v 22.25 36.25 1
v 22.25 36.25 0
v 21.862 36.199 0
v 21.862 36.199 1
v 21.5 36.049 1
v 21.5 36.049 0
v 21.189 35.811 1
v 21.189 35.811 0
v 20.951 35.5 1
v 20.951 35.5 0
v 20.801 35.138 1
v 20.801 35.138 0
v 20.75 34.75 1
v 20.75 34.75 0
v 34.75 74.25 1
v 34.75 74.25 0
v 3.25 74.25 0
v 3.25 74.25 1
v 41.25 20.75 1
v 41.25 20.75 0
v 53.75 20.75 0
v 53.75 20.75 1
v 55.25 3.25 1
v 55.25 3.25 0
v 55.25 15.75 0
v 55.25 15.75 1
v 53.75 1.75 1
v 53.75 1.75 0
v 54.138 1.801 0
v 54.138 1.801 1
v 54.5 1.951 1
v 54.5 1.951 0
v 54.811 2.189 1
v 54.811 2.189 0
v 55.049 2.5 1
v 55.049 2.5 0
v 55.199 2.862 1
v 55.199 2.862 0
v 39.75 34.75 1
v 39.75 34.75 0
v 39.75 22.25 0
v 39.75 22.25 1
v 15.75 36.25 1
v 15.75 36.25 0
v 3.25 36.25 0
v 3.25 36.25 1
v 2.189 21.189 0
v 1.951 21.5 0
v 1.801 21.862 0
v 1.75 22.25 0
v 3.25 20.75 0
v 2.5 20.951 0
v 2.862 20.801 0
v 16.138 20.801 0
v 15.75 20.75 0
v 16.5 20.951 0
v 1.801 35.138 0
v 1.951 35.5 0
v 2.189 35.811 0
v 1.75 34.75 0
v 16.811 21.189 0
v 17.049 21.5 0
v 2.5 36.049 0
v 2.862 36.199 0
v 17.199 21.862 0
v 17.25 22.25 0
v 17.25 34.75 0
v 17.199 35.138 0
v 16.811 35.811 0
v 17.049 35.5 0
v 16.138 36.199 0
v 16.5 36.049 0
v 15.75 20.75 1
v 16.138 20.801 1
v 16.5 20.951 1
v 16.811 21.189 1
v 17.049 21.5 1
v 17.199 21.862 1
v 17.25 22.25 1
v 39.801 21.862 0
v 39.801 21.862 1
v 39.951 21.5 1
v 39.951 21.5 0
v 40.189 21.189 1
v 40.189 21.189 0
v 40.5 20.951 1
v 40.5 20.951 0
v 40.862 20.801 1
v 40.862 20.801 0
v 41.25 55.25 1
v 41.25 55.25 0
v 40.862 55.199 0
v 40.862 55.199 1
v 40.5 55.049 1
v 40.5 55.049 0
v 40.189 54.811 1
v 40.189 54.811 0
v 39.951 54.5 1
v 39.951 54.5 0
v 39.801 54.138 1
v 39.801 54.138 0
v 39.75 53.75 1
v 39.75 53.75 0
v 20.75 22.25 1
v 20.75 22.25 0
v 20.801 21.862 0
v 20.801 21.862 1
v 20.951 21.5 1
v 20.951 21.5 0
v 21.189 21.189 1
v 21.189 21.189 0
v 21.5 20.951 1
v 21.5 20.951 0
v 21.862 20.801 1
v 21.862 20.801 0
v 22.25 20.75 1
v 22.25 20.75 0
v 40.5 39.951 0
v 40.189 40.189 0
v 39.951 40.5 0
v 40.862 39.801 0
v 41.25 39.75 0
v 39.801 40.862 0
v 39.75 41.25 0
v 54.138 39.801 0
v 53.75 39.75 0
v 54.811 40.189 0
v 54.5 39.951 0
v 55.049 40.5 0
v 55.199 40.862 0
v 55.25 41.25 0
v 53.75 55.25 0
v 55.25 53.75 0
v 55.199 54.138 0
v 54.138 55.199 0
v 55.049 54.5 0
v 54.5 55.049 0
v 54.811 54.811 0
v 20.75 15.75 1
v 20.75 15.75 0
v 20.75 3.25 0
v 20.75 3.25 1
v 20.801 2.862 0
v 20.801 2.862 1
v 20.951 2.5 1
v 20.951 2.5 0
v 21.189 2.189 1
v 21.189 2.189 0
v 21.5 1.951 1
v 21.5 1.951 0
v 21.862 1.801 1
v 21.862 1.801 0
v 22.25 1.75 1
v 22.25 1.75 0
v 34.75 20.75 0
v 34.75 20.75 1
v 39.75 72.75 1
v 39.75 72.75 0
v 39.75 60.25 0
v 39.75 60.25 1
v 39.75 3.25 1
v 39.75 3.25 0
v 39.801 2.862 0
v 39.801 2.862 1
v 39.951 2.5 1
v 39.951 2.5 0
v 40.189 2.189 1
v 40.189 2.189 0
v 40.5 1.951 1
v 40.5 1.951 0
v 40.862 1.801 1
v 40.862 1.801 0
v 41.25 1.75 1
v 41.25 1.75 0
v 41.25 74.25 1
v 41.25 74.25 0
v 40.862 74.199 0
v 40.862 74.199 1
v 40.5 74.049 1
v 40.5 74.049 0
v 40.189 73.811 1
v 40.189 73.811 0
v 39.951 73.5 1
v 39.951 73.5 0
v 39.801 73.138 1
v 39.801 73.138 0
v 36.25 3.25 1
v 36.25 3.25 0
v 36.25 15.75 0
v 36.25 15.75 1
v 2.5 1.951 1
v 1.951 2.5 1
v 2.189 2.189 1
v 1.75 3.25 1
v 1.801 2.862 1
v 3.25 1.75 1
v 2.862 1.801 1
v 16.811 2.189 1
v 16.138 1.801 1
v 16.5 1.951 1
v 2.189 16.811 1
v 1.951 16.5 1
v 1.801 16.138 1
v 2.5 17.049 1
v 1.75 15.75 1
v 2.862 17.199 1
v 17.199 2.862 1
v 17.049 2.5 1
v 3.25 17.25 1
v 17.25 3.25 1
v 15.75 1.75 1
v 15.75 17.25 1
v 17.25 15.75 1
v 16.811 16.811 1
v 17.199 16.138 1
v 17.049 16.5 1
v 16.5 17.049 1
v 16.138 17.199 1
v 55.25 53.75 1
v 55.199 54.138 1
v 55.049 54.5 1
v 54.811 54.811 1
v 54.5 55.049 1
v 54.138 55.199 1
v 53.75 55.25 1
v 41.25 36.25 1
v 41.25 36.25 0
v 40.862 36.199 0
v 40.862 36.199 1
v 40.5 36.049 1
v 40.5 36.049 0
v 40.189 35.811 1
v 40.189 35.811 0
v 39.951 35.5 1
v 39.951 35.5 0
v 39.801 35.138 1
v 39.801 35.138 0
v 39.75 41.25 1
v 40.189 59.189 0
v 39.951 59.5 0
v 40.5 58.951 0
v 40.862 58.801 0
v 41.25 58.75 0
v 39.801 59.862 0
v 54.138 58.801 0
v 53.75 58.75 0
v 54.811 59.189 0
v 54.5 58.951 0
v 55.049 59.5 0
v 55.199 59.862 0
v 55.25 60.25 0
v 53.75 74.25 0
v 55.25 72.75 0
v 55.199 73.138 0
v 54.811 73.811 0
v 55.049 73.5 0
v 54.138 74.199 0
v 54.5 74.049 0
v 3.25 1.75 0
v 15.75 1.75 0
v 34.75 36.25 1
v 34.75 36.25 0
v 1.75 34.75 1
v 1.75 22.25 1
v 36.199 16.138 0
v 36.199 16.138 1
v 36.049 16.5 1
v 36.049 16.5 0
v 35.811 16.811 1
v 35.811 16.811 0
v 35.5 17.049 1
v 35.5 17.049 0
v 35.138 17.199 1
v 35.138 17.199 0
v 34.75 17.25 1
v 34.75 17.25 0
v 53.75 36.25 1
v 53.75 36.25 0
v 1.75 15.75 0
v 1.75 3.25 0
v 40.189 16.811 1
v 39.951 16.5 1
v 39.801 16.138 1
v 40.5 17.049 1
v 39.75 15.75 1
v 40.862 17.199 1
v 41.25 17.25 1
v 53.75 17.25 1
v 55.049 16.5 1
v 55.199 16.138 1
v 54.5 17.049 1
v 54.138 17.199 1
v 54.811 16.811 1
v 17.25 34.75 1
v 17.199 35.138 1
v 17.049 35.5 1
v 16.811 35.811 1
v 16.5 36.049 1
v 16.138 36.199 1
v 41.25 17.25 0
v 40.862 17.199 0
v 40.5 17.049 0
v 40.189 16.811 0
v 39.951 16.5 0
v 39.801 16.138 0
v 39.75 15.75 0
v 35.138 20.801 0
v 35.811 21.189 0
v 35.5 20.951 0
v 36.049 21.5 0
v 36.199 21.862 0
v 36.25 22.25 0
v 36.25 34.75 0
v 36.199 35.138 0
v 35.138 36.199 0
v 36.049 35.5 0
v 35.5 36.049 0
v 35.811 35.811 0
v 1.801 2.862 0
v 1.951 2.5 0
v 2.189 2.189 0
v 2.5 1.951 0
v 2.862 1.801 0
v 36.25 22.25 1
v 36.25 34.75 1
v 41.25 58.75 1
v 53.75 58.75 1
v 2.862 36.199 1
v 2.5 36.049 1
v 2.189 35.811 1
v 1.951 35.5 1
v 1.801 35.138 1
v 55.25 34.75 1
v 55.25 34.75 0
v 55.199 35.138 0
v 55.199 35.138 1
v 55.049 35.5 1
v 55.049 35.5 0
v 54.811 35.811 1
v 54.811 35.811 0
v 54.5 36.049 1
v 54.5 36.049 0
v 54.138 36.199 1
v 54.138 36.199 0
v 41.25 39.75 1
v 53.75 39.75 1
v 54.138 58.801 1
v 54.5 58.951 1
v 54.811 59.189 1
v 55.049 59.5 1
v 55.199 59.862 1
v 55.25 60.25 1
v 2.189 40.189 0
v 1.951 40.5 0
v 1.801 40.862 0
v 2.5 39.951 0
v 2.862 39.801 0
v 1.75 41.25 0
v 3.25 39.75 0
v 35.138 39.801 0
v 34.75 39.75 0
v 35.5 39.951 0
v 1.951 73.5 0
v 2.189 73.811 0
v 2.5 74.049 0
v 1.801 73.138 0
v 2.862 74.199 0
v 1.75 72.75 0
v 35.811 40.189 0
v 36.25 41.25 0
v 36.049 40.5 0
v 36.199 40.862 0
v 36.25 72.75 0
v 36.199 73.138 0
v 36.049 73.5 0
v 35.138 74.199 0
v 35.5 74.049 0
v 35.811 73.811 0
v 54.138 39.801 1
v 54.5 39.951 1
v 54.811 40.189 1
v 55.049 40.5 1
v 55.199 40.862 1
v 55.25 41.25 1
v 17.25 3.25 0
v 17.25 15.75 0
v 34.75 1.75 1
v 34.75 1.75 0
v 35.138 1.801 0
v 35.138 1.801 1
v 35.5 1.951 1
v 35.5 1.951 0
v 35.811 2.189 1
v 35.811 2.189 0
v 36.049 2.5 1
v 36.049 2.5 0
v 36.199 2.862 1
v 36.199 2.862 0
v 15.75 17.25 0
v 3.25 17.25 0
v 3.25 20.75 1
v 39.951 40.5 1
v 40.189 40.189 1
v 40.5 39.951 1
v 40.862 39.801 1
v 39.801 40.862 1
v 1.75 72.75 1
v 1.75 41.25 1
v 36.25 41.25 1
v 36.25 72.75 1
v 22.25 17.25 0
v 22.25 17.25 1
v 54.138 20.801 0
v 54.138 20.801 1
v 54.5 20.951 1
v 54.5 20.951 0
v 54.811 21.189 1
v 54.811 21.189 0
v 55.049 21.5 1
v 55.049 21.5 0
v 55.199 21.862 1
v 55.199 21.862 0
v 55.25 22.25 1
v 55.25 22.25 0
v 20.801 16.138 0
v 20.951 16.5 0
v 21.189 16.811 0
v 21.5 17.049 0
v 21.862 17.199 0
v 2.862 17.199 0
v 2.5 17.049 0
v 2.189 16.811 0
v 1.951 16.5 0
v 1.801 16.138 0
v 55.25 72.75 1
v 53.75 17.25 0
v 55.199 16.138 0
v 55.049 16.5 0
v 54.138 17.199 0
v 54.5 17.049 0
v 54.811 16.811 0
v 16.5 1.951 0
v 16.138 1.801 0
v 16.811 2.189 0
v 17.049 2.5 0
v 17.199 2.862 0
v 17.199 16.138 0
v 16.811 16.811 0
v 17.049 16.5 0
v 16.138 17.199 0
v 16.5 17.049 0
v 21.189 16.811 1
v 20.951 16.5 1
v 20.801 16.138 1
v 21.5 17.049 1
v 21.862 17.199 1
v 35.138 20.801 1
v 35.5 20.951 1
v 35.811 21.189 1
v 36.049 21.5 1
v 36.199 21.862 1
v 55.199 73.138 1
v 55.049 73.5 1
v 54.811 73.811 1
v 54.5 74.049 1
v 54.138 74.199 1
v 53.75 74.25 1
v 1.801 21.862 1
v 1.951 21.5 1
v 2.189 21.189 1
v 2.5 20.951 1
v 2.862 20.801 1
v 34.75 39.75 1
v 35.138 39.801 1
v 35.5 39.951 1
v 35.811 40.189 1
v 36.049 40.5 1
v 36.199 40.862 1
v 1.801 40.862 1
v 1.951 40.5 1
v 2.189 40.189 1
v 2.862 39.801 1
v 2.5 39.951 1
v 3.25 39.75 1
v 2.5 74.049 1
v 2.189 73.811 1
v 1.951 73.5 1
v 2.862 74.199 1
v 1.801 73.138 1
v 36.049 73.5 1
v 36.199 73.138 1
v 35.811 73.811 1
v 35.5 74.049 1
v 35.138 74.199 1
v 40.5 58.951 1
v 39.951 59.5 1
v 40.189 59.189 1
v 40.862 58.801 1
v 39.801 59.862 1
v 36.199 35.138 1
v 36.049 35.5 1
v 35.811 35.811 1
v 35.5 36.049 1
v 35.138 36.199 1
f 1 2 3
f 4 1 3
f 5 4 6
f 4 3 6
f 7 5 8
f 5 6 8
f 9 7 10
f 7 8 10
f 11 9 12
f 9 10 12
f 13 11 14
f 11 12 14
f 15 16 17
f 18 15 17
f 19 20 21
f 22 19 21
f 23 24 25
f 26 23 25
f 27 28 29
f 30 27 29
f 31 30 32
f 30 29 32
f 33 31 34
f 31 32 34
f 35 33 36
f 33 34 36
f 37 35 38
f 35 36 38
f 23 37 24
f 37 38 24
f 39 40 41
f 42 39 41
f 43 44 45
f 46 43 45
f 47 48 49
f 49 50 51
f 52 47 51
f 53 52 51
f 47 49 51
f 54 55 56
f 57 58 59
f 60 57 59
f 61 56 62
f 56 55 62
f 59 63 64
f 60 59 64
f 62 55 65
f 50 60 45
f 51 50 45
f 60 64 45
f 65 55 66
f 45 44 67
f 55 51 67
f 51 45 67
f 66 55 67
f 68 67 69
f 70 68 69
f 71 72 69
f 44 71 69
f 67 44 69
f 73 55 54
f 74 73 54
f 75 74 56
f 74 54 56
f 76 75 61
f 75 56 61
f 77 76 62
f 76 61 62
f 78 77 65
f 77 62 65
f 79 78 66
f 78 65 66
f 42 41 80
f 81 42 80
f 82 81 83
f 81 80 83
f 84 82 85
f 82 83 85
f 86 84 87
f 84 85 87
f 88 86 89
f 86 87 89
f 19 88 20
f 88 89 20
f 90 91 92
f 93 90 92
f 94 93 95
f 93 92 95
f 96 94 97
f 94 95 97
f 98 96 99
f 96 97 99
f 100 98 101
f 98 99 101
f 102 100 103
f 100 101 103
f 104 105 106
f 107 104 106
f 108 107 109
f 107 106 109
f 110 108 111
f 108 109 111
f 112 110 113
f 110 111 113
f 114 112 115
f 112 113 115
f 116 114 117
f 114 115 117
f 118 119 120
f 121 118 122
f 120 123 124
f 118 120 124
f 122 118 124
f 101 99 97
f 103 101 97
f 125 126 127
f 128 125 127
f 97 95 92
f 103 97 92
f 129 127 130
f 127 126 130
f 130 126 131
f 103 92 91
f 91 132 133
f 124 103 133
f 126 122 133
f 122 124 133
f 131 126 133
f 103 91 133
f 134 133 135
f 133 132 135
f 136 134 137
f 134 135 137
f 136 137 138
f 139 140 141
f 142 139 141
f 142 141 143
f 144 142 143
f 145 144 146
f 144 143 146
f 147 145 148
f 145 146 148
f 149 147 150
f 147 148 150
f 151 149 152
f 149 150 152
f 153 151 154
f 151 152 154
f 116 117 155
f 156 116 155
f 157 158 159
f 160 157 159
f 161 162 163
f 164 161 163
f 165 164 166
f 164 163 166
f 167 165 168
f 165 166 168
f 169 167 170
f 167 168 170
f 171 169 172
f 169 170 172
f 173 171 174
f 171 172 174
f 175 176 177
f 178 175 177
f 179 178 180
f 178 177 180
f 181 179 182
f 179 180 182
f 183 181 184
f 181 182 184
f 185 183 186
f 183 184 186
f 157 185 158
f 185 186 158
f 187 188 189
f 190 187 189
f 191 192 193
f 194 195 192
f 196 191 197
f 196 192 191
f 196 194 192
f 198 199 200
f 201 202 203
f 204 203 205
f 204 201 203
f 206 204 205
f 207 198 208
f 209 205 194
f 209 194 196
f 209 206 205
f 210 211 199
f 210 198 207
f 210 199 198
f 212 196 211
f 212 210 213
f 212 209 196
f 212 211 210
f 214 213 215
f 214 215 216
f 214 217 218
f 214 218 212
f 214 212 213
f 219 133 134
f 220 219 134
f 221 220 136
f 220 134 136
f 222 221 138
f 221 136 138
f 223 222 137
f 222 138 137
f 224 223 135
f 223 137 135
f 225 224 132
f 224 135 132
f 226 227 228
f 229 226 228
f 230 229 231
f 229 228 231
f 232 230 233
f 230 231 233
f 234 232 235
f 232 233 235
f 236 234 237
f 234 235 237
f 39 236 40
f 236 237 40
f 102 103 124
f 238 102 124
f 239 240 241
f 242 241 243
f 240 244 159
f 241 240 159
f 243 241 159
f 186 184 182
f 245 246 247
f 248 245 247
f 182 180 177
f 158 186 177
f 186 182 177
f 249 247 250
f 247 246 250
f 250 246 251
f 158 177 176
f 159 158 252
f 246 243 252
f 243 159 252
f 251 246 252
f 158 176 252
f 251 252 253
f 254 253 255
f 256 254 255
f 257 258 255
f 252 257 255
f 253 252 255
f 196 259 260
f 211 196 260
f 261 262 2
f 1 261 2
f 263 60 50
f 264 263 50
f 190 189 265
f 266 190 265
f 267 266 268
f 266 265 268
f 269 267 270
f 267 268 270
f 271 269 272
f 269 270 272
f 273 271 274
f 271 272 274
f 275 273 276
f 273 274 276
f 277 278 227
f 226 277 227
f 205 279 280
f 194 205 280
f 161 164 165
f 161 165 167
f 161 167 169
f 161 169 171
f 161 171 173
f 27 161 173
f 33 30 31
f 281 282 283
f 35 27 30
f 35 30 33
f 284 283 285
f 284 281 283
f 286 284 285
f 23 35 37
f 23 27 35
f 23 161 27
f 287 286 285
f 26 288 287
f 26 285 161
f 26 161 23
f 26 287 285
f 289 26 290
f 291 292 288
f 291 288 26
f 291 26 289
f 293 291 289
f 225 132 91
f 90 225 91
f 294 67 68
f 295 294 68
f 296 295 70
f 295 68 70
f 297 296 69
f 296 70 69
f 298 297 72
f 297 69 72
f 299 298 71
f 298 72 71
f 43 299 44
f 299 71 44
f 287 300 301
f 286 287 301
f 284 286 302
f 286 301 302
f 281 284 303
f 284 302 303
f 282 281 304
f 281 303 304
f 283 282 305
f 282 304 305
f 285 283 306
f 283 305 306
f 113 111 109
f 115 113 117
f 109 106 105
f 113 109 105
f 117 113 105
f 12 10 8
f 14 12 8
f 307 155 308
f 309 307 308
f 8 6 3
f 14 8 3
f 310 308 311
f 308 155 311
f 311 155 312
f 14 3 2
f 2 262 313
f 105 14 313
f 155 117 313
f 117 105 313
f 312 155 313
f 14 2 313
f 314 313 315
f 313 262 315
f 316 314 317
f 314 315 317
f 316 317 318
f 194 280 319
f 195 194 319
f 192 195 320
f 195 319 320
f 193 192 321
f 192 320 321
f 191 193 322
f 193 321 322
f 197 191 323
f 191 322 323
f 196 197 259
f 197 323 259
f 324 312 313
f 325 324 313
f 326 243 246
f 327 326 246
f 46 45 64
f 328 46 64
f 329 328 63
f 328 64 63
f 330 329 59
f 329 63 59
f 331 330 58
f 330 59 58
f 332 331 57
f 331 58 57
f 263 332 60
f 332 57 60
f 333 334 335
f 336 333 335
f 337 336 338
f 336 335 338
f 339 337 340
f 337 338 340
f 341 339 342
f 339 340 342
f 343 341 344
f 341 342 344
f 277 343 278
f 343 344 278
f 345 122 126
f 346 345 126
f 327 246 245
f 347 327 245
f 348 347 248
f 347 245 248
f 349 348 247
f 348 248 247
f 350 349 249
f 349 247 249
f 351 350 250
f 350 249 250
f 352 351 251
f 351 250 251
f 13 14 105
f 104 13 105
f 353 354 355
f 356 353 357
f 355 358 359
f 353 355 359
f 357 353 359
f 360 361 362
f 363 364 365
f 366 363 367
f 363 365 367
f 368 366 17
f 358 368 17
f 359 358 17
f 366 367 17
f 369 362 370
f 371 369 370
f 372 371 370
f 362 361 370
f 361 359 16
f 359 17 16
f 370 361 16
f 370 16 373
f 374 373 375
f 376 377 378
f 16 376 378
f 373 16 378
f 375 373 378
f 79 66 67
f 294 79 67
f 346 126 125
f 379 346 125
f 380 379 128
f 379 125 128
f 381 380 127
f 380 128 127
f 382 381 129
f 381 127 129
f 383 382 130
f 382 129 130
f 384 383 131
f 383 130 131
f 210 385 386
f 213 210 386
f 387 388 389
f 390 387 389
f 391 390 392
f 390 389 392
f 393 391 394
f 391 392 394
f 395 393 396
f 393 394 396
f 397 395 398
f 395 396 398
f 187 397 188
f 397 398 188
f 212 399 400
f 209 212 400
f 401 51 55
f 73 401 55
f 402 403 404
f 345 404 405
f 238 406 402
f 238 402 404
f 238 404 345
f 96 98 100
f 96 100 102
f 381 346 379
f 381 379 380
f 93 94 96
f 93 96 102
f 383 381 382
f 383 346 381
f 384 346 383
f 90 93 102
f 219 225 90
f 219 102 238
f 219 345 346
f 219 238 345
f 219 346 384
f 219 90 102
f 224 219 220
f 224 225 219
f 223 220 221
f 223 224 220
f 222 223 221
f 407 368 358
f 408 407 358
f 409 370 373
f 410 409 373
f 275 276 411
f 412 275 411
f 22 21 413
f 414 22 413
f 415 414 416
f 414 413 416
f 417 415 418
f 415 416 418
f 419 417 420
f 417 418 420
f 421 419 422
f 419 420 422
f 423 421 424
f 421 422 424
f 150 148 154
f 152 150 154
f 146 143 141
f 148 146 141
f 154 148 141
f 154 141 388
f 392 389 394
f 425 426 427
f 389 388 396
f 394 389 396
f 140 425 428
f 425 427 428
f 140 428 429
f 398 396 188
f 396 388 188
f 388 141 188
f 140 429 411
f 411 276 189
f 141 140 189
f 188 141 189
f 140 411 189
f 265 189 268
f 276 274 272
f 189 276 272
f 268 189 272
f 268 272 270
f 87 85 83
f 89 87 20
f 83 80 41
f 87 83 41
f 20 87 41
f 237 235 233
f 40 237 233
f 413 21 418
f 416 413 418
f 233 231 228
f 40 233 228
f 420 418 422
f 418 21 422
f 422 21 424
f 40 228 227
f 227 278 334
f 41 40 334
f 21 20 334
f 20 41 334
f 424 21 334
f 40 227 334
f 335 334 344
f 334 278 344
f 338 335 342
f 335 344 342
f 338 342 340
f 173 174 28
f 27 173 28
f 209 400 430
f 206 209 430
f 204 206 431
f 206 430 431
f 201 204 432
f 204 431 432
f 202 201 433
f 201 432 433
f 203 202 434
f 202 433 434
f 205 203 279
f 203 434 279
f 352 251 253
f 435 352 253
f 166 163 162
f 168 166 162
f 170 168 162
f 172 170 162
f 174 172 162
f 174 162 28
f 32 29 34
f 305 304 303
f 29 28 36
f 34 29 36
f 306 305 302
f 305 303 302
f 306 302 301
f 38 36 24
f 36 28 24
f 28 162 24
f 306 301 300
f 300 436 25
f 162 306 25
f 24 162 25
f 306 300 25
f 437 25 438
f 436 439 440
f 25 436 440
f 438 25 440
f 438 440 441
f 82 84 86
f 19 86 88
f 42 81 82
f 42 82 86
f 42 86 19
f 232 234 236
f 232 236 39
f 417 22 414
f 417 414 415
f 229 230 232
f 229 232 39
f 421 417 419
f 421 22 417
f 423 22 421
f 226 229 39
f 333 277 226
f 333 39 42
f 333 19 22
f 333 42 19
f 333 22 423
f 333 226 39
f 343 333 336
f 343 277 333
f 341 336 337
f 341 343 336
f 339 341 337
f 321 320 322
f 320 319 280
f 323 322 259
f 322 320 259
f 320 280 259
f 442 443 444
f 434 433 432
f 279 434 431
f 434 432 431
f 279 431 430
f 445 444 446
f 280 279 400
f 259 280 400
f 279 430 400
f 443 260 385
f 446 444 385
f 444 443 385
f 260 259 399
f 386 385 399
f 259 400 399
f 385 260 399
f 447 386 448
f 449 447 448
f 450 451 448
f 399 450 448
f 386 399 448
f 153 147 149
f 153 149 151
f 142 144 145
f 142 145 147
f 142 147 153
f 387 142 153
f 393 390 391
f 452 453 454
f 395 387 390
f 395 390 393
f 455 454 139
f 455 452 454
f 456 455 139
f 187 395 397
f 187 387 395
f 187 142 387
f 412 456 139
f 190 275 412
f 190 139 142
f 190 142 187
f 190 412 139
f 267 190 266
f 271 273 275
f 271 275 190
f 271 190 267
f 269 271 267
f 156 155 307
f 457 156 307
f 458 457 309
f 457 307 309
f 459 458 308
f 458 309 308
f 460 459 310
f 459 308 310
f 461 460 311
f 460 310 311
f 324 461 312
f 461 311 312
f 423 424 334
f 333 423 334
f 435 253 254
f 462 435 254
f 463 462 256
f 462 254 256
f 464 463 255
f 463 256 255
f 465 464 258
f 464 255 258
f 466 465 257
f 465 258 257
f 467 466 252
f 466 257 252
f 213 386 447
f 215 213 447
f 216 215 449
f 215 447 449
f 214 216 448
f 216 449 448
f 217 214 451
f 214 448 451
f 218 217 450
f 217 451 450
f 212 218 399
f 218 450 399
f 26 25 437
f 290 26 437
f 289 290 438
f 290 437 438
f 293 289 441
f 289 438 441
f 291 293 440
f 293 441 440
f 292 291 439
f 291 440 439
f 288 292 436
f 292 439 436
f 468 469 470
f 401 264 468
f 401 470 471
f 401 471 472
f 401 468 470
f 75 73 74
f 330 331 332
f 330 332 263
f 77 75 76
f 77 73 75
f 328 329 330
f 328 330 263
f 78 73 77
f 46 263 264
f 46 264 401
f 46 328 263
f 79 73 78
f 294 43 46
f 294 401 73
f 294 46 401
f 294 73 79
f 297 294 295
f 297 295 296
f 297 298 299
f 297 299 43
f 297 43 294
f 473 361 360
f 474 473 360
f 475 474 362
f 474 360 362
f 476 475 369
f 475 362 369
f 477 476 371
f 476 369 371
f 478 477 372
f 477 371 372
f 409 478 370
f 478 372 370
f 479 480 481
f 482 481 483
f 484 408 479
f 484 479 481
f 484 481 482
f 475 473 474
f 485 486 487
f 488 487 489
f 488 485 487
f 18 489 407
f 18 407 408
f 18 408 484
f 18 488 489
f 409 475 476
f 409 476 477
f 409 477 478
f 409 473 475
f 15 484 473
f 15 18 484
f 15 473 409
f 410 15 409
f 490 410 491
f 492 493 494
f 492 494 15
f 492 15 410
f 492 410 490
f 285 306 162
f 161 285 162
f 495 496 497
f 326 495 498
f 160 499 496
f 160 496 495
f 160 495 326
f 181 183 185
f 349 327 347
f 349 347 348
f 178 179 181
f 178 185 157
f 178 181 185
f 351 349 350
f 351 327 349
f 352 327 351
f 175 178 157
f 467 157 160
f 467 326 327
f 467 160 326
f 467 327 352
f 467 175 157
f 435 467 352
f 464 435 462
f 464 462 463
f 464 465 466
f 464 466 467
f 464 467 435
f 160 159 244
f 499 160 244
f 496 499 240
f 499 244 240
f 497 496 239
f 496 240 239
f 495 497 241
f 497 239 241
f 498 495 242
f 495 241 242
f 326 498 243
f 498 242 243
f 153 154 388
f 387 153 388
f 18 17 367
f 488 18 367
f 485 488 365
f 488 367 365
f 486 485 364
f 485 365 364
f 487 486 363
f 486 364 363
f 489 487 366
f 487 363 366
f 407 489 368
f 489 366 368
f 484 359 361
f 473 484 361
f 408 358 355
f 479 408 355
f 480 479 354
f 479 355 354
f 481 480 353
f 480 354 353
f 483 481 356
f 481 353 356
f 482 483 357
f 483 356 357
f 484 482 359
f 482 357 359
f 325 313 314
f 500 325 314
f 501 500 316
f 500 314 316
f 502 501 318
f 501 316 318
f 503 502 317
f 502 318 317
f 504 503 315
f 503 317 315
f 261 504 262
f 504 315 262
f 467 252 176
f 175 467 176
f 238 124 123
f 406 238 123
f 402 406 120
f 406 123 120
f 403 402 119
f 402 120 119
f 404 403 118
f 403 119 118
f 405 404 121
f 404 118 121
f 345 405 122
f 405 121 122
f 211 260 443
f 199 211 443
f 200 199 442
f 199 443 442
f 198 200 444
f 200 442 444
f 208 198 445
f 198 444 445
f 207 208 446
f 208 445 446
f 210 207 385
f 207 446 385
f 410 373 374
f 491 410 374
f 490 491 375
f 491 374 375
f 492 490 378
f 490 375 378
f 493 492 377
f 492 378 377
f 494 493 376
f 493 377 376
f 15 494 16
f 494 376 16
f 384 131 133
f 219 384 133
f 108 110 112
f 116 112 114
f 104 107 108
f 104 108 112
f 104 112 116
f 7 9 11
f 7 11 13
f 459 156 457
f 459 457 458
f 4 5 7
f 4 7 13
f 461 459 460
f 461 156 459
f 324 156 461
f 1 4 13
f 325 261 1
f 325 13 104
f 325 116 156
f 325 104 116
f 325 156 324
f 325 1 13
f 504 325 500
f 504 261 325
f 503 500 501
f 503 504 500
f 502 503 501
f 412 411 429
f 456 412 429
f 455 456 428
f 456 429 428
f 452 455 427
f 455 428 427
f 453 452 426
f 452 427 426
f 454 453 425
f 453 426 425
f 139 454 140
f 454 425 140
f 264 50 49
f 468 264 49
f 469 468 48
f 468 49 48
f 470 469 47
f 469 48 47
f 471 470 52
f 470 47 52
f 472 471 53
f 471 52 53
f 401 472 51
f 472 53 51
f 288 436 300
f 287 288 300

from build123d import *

# Parameters (mm, degrees)
F1_DEPTH = 1


with BuildPart() as f1:
    # F0 (on Top) → F1 (new body)
    with BuildSketch(Plane.XY):
        with BuildLine():
            Line((15.75, 17.25), (3.25, 17.25))
            ThreePointArc((3.25, 17.25), (2.18934, 16.81066), (1.75, 15.75))
            Line((1.75, 15.75), (1.75, 3.25))
            ThreePointArc((1.75, 3.25), (2.18934, 2.18934), (3.25, 1.75))
            Line((3.25, 1.75), (15.75, 1.75))
            ThreePointArc((15.75, 1.75), (16.81066, 2.18934), (17.25, 3.25))
            Line((17.25, 3.25), (17.25, 15.75))
            ThreePointArc((17.25, 15.75), (16.81066, 16.81066), (15.75, 17.25))
        make_face()
        with BuildLine():
            Line((17.25, 22.25), (17.25, 34.75))
            ThreePointArc((17.25, 34.75), (16.81066, 35.81066), (15.75, 36.25))
            Line((15.75, 36.25), (3.25, 36.25))
            ThreePointArc((3.25, 36.25), (2.18934, 35.81066), (1.75, 34.75))
            Line((1.75, 34.75), (1.75, 22.25))
            ThreePointArc((1.75, 22.25), (2.18934, 21.18934), (3.25, 20.75))
            Line((3.25, 20.75), (15.75, 20.75))
            ThreePointArc((15.75, 20.75), (16.81066, 21.18934), (17.25, 22.25))
        make_face()
        with BuildLine():
            Line((1.75, 53.75), (1.75, 41.25))
            ThreePointArc((1.75, 41.25), (2.18934, 40.18934), (3.25, 39.75))
            Line((3.25, 39.75), (15.75, 39.75))
            Line((15.75, 39.75), (22.25, 39.75))
            Line((22.25, 39.75), (34.75, 39.75))
            ThreePointArc((34.75, 39.75), (35.81066, 40.18934), (36.25, 41.25))
            Line((36.25, 41.25), (36.25, 53.75))
            Line((36.25, 53.75), (36.25, 60.25))
            Line((36.25, 60.25), (36.25, 72.75))
            ThreePointArc((36.25, 72.75), (35.81066, 73.81066), (34.75, 74.25))
            Line((34.75, 74.25), (22.25, 74.25))
            Line((22.25, 74.25), (15.75, 74.25))
            Line((15.75, 74.25), (3.25, 74.25))
            ThreePointArc((3.25, 74.25), (2.18934, 73.81066), (1.75, 72.75))
            Line((1.75, 72.75), (1.75, 60.25))
            Line((1.75, 60.25), (1.75, 53.75))
        make_face()
        with BuildLine():
            Line((36.25, 3.25), (36.25, 15.75))
            ThreePointArc((36.25, 15.75), (35.81066, 16.81066), (34.75, 17.25))
            Line((34.75, 17.25), (22.25, 17.25))
            ThreePointArc((22.25, 17.25), (21.18934, 16.81066), (20.75, 15.75))
            Line((20.75, 15.75), (20.75, 3.25))
            ThreePointArc((20.75, 3.25), (21.18934, 2.18934), (22.25, 1.75))
            Line((22.25, 1.75), (34.75, 1.75))
            ThreePointArc((34.75, 1.75), (35.81066, 2.18934), (36.25, 3.25))
        make_face()
        with BuildLine():
            Line((36.25, 22.25), (36.25, 34.75))
            ThreePointArc((36.25, 34.75), (35.81066, 35.81066), (34.75, 36.25))
            Line((34.75, 36.25), (22.25, 36.25))
            ThreePointArc((22.25, 36.25), (21.18934, 35.81066), (20.75, 34.75))
            Line((20.75, 34.75), (20.75, 22.25))
            ThreePointArc((20.75, 22.25), (21.18934, 21.18934), (22.25, 20.75))
            Line((22.25, 20.75), (34.75, 20.75))
            ThreePointArc((34.75, 20.75), (35.81066, 21.18934), (36.25, 22.25))
        make_face()
        with BuildLine():
            Line((55.25, 3.25), (55.25, 15.75))
            ThreePointArc((55.25, 15.75), (54.81066, 16.81066), (53.75, 17.25))
            Line((53.75, 17.25), (41.25, 17.25))
            ThreePointArc((41.25, 17.25), (40.18934, 16.81066), (39.75, 15.75))
            Line((39.75, 15.75), (39.75, 3.25))
            ThreePointArc((39.75, 3.25), (40.18934, 2.18934), (41.25, 1.75))
            Line((41.25, 1.75), (53.75, 1.75))
            ThreePointArc((53.75, 1.75), (54.81066, 2.18934), (55.25, 3.25))
        make_face()
        with BuildLine():
            Line((55.25, 22.25), (55.25, 34.75))
            ThreePointArc((55.25, 34.75), (54.81066, 35.81066), (53.75, 36.25))
            Line((53.75, 36.25), (41.25, 36.25))
            ThreePointArc((41.25, 36.25), (40.18934, 35.81066), (39.75, 34.75))
            Line((39.75, 34.75), (39.75, 22.25))
            ThreePointArc((39.75, 22.25), (40.18934, 21.18934), (41.25, 20.75))
            Line((41.25, 20.75), (53.75, 20.75))
            ThreePointArc((53.75, 20.75), (54.81066, 21.18934), (55.25, 22.25))
        make_face()
        with BuildLine():
            Line((55.25, 41.25), (55.25, 53.75))
            ThreePointArc((55.25, 53.75), (54.81066, 54.81066), (53.75, 55.25))
            Line((53.75, 55.25), (41.25, 55.25))
            ThreePointArc((41.25, 55.25), (40.18934, 54.81066), (39.75, 53.75))
            Line((39.75, 53.75), (39.75, 41.25))
            ThreePointArc((39.75, 41.25), (40.18934, 40.18934), (41.25, 39.75))
            Line((41.25, 39.75), (53.75, 39.75))
            ThreePointArc((53.75, 39.75), (54.81066, 40.18934), (55.25, 41.25))
        make_face()
        with BuildLine():
            Line((55.25, 60.25), (55.25, 72.75))
            ThreePointArc((55.25, 72.75), (54.81066, 73.81066), (53.75, 74.25))
            Line((53.75, 74.25), (41.25, 74.25))
            ThreePointArc((41.25, 74.25), (40.18934, 73.81066), (39.75, 72.75))
            Line((39.75, 72.75), (39.75, 60.25))
            ThreePointArc((39.75, 60.25), (40.18934, 59.18934), (41.25, 58.75))
            Line((41.25, 58.75), (53.75, 58.75))
            ThreePointArc((53.75, 58.75), (54.81066, 59.18934), (55.25, 60.25))
        make_face()
    extrude(amount=F1_DEPTH)


solid = f1.part
